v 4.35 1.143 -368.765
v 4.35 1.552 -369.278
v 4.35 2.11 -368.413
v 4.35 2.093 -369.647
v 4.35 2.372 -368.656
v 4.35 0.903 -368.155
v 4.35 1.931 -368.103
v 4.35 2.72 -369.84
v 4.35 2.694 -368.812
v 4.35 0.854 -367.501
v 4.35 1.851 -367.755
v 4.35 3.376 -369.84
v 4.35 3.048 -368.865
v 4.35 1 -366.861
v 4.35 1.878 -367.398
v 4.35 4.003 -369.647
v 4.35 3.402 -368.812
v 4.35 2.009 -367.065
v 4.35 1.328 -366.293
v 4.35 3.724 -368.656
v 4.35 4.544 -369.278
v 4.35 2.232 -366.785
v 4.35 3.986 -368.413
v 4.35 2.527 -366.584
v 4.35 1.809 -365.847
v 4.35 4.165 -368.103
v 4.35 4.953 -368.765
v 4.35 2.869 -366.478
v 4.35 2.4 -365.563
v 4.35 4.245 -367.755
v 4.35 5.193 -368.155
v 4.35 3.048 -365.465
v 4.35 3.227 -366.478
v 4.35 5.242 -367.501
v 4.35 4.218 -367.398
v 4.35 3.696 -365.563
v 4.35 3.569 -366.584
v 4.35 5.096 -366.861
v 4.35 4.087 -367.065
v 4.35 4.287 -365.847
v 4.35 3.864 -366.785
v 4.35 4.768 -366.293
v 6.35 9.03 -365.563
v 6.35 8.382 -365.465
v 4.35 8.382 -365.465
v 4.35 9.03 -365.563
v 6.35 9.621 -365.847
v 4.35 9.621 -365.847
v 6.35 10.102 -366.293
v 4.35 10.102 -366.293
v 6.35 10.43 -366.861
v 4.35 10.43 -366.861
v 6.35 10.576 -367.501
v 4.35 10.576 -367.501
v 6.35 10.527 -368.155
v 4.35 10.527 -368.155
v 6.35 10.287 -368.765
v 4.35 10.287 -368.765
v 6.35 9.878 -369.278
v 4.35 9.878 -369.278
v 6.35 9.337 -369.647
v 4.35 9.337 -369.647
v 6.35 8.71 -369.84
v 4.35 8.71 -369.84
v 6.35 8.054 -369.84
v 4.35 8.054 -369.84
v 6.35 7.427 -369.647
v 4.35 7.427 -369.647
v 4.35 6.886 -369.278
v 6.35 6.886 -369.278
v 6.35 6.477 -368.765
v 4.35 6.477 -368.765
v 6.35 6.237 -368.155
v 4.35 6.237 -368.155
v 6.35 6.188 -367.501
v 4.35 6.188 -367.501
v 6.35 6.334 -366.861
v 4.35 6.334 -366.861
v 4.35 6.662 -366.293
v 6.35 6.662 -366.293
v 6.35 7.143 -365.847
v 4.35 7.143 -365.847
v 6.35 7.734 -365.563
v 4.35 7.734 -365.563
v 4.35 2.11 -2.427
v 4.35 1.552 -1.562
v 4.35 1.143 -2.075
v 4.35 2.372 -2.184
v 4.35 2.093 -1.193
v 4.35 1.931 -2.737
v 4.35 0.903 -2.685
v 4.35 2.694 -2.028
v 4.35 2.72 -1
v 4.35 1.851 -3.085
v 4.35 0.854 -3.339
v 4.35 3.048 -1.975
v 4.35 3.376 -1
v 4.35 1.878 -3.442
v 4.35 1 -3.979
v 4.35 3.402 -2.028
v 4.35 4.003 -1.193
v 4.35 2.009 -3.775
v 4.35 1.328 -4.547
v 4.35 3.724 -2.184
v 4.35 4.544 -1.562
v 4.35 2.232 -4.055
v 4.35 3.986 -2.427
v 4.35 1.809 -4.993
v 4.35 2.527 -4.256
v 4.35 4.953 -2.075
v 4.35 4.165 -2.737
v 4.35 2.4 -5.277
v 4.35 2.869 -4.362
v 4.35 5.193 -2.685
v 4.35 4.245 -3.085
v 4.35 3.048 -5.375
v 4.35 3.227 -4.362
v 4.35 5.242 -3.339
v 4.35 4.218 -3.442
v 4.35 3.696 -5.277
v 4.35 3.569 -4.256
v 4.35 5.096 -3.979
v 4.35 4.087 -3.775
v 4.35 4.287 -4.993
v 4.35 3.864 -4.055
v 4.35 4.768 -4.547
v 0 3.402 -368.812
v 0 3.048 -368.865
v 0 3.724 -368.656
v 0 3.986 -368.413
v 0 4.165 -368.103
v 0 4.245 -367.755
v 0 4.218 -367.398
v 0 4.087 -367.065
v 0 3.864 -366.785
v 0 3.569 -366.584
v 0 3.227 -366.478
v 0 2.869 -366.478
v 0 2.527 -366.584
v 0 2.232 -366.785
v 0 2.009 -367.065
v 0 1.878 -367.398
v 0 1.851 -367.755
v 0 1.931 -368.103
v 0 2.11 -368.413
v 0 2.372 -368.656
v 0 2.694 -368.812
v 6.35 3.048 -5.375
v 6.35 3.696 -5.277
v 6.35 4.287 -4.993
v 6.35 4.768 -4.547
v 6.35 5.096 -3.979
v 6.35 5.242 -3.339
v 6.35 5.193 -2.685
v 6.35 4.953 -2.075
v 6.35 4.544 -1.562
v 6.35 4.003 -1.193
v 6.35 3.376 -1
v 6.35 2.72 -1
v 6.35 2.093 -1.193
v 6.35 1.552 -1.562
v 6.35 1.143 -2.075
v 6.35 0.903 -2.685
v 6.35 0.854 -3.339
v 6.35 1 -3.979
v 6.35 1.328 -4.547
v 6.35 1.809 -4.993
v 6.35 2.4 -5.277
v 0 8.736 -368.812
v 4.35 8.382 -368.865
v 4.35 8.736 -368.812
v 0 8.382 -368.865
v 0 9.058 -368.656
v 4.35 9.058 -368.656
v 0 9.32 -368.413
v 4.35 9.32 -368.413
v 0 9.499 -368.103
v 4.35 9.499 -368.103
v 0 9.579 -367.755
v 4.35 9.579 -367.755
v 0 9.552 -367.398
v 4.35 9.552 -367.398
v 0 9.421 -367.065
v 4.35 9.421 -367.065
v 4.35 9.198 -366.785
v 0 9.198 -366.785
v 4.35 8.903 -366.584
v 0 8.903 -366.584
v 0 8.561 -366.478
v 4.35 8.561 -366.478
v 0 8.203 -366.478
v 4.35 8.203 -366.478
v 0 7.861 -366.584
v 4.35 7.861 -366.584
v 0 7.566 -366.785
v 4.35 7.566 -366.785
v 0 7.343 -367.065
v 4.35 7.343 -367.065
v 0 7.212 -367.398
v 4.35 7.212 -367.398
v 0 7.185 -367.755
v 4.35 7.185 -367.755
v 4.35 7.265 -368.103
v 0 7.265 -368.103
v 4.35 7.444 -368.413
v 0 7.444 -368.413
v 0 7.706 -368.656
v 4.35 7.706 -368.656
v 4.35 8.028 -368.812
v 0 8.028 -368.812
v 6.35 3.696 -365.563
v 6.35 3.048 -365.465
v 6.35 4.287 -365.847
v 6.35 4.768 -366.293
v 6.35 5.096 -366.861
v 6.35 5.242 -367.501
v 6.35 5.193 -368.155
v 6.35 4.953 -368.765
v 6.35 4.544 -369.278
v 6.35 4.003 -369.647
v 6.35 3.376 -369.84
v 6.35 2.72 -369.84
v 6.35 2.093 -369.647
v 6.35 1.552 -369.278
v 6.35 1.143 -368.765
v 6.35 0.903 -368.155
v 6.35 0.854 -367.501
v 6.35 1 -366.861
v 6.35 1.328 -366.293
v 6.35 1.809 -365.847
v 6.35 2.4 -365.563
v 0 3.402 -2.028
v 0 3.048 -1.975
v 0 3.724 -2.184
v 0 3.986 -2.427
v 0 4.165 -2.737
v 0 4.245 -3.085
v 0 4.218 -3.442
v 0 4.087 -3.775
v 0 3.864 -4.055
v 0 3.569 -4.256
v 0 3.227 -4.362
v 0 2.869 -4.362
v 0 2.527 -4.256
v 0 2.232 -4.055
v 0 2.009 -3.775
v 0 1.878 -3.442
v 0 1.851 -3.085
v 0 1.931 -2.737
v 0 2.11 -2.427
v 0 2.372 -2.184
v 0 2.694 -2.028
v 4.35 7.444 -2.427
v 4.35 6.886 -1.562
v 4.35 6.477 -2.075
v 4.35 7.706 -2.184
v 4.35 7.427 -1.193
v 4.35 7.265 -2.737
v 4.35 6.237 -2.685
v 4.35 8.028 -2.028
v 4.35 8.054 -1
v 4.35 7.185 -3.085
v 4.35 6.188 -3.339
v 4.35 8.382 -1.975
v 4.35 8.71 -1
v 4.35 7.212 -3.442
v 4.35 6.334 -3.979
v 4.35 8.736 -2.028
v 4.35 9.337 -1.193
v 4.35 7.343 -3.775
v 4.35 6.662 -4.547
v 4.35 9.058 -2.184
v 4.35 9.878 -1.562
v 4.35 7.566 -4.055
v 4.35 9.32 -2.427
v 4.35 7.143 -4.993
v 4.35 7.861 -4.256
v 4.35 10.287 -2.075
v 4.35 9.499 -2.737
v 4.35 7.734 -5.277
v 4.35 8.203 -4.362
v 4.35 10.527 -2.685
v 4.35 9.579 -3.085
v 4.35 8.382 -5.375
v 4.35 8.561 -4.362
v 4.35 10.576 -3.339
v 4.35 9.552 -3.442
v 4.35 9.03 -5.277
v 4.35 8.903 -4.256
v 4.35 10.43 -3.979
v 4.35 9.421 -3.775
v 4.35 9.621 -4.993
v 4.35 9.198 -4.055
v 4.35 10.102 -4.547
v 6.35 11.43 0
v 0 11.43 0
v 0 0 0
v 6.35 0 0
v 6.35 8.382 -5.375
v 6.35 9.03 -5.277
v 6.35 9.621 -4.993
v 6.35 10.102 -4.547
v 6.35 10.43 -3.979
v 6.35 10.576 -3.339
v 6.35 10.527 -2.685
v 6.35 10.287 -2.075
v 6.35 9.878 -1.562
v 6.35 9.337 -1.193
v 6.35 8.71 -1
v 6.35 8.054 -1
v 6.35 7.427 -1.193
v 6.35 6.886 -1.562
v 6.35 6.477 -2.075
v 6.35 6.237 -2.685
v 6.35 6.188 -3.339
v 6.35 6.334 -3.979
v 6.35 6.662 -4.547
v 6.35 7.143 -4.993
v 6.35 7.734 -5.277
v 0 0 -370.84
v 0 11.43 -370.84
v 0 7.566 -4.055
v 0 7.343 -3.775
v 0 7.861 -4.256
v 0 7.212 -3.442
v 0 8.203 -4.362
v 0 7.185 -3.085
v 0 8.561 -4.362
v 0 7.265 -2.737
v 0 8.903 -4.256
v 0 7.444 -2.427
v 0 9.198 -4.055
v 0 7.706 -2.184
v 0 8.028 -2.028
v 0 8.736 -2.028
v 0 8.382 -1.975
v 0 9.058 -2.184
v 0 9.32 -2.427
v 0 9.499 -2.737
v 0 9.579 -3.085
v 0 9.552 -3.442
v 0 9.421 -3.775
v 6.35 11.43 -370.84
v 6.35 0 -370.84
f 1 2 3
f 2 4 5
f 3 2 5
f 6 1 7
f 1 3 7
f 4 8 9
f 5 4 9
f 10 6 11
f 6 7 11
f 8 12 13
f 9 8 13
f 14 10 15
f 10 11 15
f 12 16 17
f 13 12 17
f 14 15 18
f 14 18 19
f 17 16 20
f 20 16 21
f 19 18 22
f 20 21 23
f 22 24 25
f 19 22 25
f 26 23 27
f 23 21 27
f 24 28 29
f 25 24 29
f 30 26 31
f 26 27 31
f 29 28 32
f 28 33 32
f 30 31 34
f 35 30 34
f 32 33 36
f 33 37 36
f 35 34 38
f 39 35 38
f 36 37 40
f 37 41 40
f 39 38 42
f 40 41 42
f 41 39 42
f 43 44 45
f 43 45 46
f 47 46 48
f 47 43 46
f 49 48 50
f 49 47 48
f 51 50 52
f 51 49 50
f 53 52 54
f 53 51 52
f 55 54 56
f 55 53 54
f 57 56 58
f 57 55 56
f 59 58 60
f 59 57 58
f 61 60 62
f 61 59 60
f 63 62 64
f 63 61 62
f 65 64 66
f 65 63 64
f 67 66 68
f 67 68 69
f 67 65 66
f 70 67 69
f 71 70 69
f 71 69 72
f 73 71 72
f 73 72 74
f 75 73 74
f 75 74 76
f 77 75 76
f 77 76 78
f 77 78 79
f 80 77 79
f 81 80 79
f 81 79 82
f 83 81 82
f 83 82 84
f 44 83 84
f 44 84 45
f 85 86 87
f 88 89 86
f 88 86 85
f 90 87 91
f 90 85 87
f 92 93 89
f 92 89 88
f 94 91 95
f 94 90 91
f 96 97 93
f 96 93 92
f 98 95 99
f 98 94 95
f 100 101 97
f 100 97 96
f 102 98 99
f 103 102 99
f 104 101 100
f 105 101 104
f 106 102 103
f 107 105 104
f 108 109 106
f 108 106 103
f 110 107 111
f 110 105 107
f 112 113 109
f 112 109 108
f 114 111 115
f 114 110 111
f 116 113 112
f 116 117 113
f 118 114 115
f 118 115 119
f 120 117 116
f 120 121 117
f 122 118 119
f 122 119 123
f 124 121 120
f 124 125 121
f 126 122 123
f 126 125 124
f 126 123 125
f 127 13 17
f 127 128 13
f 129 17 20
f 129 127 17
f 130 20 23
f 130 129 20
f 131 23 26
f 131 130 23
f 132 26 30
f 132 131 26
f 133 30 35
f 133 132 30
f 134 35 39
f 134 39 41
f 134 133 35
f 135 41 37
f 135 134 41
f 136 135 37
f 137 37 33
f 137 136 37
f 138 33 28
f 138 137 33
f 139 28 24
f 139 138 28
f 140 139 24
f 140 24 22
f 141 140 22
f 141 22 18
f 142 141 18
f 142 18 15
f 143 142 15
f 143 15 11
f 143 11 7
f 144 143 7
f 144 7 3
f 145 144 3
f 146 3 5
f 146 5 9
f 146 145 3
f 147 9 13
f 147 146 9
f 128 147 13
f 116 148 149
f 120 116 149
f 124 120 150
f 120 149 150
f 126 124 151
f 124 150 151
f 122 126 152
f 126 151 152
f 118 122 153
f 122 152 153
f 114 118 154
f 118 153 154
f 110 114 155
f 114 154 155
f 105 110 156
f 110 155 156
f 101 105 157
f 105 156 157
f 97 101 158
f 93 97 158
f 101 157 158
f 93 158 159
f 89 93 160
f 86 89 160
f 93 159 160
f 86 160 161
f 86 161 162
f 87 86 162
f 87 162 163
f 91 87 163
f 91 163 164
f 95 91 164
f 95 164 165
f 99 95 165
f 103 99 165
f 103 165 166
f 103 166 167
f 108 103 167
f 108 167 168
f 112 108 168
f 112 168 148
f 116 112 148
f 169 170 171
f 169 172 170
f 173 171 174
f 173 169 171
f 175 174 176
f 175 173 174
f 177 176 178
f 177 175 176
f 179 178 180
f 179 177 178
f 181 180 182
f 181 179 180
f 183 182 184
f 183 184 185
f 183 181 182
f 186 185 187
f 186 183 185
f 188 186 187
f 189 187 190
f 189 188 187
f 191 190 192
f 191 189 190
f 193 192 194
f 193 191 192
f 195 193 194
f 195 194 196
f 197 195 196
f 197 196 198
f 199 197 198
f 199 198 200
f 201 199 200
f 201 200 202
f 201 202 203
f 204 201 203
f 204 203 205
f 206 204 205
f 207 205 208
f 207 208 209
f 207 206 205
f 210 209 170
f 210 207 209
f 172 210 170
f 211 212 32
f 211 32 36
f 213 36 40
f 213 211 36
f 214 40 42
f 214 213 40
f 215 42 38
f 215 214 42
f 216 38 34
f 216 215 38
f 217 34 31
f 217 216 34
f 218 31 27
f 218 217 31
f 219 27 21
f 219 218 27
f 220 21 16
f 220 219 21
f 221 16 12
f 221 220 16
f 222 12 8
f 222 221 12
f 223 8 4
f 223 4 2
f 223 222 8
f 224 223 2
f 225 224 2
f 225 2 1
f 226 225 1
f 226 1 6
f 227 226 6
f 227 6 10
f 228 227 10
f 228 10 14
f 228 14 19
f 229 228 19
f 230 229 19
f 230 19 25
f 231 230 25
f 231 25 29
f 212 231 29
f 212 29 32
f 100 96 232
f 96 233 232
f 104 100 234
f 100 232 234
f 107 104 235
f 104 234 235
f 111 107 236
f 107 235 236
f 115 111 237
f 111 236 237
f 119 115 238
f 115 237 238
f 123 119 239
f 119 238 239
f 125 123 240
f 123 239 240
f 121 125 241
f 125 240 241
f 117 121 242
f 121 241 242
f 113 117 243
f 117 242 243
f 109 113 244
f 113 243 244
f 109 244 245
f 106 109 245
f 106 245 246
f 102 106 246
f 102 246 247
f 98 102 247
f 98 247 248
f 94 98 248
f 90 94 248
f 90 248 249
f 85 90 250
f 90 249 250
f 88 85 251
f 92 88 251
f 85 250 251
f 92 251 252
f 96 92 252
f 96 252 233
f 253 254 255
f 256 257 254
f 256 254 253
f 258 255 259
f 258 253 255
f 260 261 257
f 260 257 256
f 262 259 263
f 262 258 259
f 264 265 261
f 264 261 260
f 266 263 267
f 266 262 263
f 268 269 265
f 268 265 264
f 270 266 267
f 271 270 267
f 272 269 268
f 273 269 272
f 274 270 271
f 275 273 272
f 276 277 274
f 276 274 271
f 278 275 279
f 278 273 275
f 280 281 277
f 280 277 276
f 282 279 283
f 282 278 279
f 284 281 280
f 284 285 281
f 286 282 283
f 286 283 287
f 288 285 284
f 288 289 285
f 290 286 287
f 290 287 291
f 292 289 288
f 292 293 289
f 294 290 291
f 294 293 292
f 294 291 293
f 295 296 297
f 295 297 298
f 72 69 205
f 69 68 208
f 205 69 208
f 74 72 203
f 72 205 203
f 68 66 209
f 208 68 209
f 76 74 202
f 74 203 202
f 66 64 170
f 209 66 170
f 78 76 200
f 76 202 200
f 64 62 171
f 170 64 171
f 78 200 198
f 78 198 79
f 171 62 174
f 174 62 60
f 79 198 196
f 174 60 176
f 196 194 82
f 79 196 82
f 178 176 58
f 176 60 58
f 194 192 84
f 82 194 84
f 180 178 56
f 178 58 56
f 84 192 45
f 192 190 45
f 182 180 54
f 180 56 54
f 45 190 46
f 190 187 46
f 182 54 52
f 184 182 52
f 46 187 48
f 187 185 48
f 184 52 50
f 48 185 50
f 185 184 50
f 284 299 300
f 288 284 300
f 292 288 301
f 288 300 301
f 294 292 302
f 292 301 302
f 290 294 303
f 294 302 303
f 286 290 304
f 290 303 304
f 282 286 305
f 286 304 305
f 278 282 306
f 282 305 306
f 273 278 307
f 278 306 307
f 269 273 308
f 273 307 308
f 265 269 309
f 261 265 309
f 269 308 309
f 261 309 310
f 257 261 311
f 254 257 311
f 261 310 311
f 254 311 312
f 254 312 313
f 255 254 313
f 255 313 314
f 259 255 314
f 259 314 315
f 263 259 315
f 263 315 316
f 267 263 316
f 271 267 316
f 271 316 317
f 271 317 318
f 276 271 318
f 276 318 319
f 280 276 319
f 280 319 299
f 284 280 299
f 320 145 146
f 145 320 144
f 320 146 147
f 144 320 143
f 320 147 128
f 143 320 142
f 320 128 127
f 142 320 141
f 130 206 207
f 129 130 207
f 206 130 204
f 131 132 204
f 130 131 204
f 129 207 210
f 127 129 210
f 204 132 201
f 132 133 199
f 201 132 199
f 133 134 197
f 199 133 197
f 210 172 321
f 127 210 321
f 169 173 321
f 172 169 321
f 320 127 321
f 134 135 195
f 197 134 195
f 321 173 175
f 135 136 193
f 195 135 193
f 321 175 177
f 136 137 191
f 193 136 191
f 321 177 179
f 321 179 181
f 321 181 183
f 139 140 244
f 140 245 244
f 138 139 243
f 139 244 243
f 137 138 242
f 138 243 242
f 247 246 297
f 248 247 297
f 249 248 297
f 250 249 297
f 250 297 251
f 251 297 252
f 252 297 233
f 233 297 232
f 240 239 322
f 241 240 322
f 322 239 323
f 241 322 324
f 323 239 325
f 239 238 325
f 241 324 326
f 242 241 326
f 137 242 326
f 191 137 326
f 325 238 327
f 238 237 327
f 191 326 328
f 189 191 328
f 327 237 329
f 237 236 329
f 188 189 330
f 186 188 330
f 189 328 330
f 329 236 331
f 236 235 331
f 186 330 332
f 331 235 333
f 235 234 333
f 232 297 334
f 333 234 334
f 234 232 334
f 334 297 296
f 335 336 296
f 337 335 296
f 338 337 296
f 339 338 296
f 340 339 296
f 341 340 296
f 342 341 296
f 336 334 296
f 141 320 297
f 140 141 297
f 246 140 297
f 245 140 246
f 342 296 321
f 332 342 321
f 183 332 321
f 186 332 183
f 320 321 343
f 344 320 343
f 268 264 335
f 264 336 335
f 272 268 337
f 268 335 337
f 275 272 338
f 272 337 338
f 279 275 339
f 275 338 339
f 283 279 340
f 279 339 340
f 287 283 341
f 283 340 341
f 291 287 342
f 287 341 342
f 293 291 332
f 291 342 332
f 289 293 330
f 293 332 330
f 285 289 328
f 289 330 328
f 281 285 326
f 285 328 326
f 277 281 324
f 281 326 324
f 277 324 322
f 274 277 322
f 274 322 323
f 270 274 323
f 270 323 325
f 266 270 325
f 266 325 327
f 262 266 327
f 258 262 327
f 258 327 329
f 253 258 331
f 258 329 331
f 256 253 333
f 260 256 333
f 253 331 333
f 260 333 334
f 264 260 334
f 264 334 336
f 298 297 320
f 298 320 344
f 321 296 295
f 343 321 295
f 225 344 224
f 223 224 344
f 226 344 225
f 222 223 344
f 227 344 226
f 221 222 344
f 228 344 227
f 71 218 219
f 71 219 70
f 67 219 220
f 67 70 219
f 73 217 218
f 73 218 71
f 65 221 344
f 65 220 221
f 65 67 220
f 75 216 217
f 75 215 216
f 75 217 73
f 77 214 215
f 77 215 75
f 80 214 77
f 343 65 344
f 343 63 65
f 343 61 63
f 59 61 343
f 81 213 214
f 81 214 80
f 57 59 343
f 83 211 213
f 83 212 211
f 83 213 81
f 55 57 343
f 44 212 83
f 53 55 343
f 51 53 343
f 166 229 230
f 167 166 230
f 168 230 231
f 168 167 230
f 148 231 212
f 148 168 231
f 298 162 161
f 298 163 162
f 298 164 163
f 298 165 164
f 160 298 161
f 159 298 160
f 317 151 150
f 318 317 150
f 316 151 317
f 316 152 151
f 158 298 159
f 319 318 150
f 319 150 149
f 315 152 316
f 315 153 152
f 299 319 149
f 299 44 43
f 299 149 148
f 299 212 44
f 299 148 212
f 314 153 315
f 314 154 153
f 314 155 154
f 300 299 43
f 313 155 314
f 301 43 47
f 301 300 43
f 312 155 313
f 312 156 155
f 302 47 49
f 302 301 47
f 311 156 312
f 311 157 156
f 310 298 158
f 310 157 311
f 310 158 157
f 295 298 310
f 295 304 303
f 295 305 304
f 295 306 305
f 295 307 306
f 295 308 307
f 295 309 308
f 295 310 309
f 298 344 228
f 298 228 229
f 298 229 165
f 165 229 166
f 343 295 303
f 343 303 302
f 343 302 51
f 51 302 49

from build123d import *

# Parameters (mm, degrees)
SKETCH1_W                      = 6.35
SKETCH1_H                      = 11.43
BOSS_EXTRUDE1_DEPTH            = 370.84
CBORE_FOR_M2_SHCS2_D           = 2.4
CBORE_FOR_M2_SHCS2_CBORE_D     = 4.4
CBORE_FOR_M2_SHCS2_CBORE_DEPTH = 2


with BuildPart() as part:
    # Sketch1 → Boss-Extrude1 (new body)
    with BuildSketch(Plane.XY):
        with Locations((3.175, 5.715)):
            Rectangle(SKETCH1_W, SKETCH1_H)
    extrude(amount=-BOSS_EXTRUDE1_DEPTH)

    # CBORE for M2 SHCS2 (through all)
    with Locations(Plane(origin=(6.35, 0, 0), x_dir=(0, 0, -1), z_dir=(1, 0, 0))):
        with Locations((3.175, 8.382), (3.175, 3.048)):
            cbore_for_m2_shcs2 = CounterBoreHole(CBORE_FOR_M2_SHCS2_D / 2, CBORE_FOR_M2_SHCS2_CBORE_D / 2, CBORE_FOR_M2_SHCS2_CBORE_DEPTH)

    # Mirror2: CBORE for M2 SHCS2 across plane
    add(cbore_for_m2_shcs2.mirror(Plane.XY.offset(-185.42)), mode=Mode.SUBTRACT)


solid = part.part
